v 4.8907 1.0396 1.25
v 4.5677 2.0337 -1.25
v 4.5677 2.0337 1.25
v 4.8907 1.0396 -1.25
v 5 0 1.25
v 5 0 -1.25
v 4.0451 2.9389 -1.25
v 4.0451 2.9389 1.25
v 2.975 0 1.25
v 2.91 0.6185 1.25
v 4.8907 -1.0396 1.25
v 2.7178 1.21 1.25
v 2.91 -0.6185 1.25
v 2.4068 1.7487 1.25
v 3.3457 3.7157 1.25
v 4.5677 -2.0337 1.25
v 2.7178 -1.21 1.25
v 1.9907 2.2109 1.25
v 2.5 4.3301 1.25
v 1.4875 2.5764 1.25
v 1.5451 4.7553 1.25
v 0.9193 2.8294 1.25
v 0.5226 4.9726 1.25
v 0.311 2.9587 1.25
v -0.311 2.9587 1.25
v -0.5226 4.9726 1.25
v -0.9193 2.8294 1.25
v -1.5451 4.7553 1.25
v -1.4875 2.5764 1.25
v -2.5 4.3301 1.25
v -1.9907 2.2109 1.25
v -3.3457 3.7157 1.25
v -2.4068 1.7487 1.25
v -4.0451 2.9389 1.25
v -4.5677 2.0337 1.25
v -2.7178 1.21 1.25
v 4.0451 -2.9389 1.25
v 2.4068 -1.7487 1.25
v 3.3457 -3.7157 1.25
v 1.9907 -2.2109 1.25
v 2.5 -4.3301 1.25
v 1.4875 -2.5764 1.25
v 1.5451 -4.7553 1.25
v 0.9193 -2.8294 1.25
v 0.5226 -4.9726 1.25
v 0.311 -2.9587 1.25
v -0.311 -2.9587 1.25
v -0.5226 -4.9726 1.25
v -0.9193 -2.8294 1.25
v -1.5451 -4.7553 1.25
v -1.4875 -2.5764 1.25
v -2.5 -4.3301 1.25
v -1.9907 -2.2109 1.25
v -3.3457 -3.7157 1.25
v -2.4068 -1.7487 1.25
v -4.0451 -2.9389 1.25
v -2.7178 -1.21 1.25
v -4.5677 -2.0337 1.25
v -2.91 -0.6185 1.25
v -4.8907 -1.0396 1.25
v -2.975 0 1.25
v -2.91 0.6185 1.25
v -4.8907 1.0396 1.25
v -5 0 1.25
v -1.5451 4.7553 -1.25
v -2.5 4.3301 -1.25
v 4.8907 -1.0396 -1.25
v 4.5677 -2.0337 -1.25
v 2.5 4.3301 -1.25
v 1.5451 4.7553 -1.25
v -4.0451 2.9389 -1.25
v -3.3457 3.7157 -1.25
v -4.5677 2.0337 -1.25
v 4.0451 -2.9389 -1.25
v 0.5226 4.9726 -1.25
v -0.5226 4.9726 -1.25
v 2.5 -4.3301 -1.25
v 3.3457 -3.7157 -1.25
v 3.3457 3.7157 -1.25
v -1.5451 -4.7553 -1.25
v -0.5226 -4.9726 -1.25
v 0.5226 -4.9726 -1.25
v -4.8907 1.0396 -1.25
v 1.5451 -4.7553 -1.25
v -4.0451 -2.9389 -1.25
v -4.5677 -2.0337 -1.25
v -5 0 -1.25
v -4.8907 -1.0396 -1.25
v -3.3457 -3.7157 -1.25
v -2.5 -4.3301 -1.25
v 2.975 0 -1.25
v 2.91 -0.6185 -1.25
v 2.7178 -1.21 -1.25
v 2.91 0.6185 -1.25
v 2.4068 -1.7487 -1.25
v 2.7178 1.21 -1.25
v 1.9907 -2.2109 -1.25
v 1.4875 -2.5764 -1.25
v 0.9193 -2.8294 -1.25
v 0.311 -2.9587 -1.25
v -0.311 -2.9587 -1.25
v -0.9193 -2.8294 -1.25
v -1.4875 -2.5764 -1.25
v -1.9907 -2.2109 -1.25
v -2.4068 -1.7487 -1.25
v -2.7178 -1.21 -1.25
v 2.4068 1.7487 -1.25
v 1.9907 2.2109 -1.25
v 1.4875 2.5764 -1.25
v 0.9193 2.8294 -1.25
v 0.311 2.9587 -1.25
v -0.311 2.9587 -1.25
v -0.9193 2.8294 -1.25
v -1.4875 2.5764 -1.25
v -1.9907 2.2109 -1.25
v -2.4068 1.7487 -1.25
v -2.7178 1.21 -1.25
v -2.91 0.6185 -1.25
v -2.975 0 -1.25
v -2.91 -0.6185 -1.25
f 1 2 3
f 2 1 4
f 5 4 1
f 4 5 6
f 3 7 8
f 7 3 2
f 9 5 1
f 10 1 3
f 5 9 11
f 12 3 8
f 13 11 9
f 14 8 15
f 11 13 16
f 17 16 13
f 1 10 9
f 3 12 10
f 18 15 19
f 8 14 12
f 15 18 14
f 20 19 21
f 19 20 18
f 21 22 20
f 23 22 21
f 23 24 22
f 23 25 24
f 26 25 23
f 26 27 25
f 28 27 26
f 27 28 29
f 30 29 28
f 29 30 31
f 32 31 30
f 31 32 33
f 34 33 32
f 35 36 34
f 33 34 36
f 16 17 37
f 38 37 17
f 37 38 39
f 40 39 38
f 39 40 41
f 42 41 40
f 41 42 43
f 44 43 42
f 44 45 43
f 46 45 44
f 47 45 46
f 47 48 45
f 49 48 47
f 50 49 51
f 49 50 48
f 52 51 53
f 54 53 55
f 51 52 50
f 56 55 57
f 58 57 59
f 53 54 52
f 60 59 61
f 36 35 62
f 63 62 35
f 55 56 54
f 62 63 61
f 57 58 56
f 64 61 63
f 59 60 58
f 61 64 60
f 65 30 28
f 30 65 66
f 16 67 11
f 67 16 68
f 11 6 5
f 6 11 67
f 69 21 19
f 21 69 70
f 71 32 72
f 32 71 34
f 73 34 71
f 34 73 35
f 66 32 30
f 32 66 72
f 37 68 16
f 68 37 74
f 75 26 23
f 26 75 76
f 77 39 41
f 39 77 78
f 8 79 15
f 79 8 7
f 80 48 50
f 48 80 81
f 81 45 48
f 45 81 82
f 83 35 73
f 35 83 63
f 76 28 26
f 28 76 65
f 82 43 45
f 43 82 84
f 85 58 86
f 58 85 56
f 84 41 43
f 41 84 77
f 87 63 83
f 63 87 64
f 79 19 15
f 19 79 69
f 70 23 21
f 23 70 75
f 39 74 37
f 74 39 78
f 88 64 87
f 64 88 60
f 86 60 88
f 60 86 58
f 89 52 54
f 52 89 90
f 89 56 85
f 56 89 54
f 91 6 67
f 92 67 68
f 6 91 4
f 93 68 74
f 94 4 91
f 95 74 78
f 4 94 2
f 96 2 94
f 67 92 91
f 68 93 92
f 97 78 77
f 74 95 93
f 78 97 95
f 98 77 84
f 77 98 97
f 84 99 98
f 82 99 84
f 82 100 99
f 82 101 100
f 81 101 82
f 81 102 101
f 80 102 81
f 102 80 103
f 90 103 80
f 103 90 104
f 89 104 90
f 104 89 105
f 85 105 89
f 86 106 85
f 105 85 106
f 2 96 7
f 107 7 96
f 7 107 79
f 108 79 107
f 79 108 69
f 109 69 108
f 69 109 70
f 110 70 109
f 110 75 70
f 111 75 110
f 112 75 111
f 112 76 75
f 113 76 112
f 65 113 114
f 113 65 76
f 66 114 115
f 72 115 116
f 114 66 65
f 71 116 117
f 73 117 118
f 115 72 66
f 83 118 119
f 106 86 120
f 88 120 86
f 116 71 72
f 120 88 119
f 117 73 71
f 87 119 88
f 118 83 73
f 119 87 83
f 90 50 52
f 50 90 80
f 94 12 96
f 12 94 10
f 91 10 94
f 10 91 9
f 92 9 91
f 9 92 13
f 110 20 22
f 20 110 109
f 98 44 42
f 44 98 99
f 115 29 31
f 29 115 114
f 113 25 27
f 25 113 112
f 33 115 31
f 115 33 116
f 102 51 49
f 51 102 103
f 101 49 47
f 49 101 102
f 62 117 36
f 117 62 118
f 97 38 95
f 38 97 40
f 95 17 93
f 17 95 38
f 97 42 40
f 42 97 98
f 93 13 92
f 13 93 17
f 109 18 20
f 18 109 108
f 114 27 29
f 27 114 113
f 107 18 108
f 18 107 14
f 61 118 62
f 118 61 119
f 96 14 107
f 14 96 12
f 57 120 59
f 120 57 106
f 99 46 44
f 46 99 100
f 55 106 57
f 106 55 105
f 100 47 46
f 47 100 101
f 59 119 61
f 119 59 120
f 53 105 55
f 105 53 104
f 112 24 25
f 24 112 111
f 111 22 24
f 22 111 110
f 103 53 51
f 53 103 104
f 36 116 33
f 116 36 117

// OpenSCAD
// file: ../settings.scad
// Common settings used by all scad files.

// ALL UNITS IN MILLIMETERS (MM)!!!

$fn = 30;//low-res but fast to render
//$fn = 50;//higher-res but slow to render

pi = 3.1415926535897932384626433832795;

max_footprint = 150; // 15x15 cm

bottom_clearance = 10;
bottom_clearance = 25.4/2+10;
//bottom_clearance = 30;

shell_alpha = 0.215;
//shell_alpha = 1.0;

tolerance = 0.5;

// Flat countersunk M2.5mm x 0.45mm machine screw.
screw_thread_diameter = 2.5;//2.8;//2.75;//2.4?
screw_thread_length = 5;//?
screw_head_diameter = 4.75; // M2.5
//screw_head_diameter = 5.2; // M3
screw_head_height = 1.5;//2;

screw_thread_diameter2 = 2;

unit_thickness = 5;
u = unit_thickness;

shell_thickness = unit_thickness;

// Show flags.
show_platform = 0;
show_head = 1;
show_head_shell = 0;
show_head_electronics_bb = 0;
show_battery = 1;
show_foot_cube = 0;
show_torso = 0;
show_motor = 0;
show_motor_plates = 1;
show_motor_inner_plates = 1;
show_motor_outer_plates = 1;
show_wheel = 0;//obsolete
show_tracks = 1;//
show_track_wheels = 1;
show_caster = 0;
show_rpi = 1;
show_vertical_plates = 1;//
show_horizontal_plates = 1;//
show_caster_plates = 0;//obsolete?
show_camera = 1;
show_screen = 0;
show_edge_mount = 1;
show_sonar_mount = 1;
show_recharge_mount = 1;
show_conduit = 1;
show_torso_shell = 1;
show_recharge_dock = 0;
show_head_tilt_axis = 0;
show_rpi_camera_axis = 0;
show_laser_axis = 0;

head_vertical_angle_tilt = 0;
//head_vertical_angle_tilt = 30;//max
//head_vertical_angle_tilt = 10;

torso_height = 120+20;

base_plate_diameter = max_footprint-unit_thickness*2;
base_plate_frame = 0;

head_height = 50;
head_offset_z = max_footprint/2;
head_middle_cutout = 85;

rpi_with_four_hats_and_clearance = 76;

qrd1114_w = 6.10;
qrd1114_l = 4.39;
qrd1114_h = 4.65;

dock_radius = 10;
dock_gripper_border = 2;
dock_gripper_instep = 0.9;
dock_gripper_cutout_tapper = 50;
dock_receiver_height = 5;

// Patriod Fuel+ 9000 mAh
battery_length = 90;
battery_width = 57;
battery_height = 23;
battery_offset_z = 30;//4;

wheel_diameter = 50;
wheel_offset_x = 65;
wheel_offset_z = wheel_diameter/2;
wheel_axle_diameter = 5;

//caster_diameter = 19.05; // 0.75 inches
caster_diameter = 25.45; // 1 inches
//caster_diameter = 15.875; // 5/8 inches
caster_holder_diameter = 30;//31;
caster_offset_y = base_plate_diameter/2 - caster_holder_diameter/2;

arduino_offset_x = 0;
arduino_offset_y = 0;
arduino_offset_z = 67;
arduino_offset_x2 = 0;
arduino_offset_y2 = -20;
arduino_offset_z2 = torso_height+bottom_clearance;

horizontal_plate_width = unit_thickness*8*2 - unit_thickness*2;
horizontal_plate_depth = unit_thickness*8*2;

vertical_plate_width = horizontal_plate_depth;
vertical_plate_height = unit_thickness*8;
vertical_plate_offset_x = wheel_offset_x-22.5;
vertical_plate_offset_z = vertical_plate_height/2 + unit_thickness/2;

vertical_battery_plate_height = 100 - 15;

caster_plate_width = horizontal_plate_width + unit_thickness*2;
caster_plate_mount_length = unit_thickness*4;
caster_plate_width_minor = caster_holder_diameter;

motor_switch_length = 20;
motor_switch_thickness = 6.5;
motor_switch_height = 11;
motor_switch_height_leads = 23;
motor_switch_on_height =  13.3;
motor_switch_hole_diameter = 2.5;
motor_switch_hole_offset_z = 6.5;//this plus diameter/2 is hole center from switch top
motor_switch_hole_spacing = 7.1;// holes are diameter/2 from this

motor_length = 60;
motor_width = 25;
motor_collar_width = 7;
motor_collar_height = 2.5;
motor_axle_width = 4;
motor_axle_height = 9.5;
motor_offset_x = 10;
//motor_offset_y = motor_width/2+5;
motor_offset_y = unit_thickness*3.5;
motor_offset_z = vertical_plate_height/2 - unit_thickness/2;//4;//30;
motor_mount_holes_dist = 17;
// motor countersink hole
motor_mount_holes_width = 3; // M3
motor_mount_holes_head_height = 2.2;
motor_mount_holes_head_width = 5.8;
motor_bearing_outer_diameter = 10;
motor_bearing_inner_diameter = 5.95;
motor_bearing_thickness = 2.5;

motor_unimount_idler_axle_d = screw_thread_diameter;
//motor_unimount_spacer_depth = 0.1;//too small
motor_unimount_spacer_depth = 0.5;

motor_arm_offset_y = -u*3;
motor_arm_offset_z = u*.5;

motor_plate_width = vertical_plate_width;
motor_plate_height = vertical_plate_height;
motor_plate_thickness = unit_thickness;
motor_plate_offset_z = vertical_plate_offset_z;

motor_plate_middle_thickness = 5;

wheel_hub_offset = u*3;

motor_hole_height_offset = -5;

nylon_spacer_outer_diameter = 6.35;
nylon_spacer_inner_diameter = 3.302;
nylon_spacer_length = 12.7;

track_width = unit_thickness*3;
track_offset_x = -50;
track_offset_z = .1;
//track_wheel_radius = 19;//original
track_wheel_radius = 14;
//track_wheel_hole_radius = (nylon_spacer_outer_diameter+1)/2;
track_wheel_hole_radius = motor_bearing_outer_diameter/2;

track_driver_hole_radius = (motor_axle_width)/2 + 0.1;
track_driver_set_screw_head_d = 4.1;
track_driver_set_screw_shaft_d = 2.4;
//track_wheel_width = 13.5;//original
track_wheel_width = u*2;
track_wheel_width_buffer = u*0.25;
track_offset = 3;        //distance from chassis
track_wheel_offset = track_offset;
//track_length = 250; // see tread_triangle.py, too big
//track_length = 240; // see tread_triangle.py
//track_length = 238; //inc/dec in 10 unit increments so notches match idlers
track_length = 228; //inc/dec in 10 unit increments so notches match idlers
track_radius = track_length/2/pi;
track_wheel_show_fancy = 1;
track_wheel_gap = track_wheel_width + track_wheel_width_buffer*2;
track_axle_bearing_diameter = motor_bearing_inner_diameter - 0.1;
track_tensioner_radius = 12;
track_nut_height = 3.5; //TODO
track_punchout_thickness = 0.25;//should be the same as the minimum layer thickness

head_slew_bearing_outer_diameter = 115;
head_slew_bearing_ring_thickness = 20;
head_slew_bearing_inner_diameter = head_slew_bearing_outer_diameter - head_slew_bearing_ring_thickness;
//head_slew_bearing_hole_diameter = head_slew_bearing_inner_diameter - head_slew_bearing_ring_thickness;
head_slew_bearing_hole_diameter = 12+tolerance; // slip ring https://www.adafruit.com/products/775
//head_slew_bearing_ball_diameter = 5;
head_slew_bearing_ball_diameter = 2.5; //u/2;
head_slew_bearing_height = u;//head_slew_bearing_ball_diameter*2;
head_slew_bearing_gap = 0.5;
head_slew_bearing_slew_gap = 0;
head_slew_bearing_gap_factor = 0.1;

neck_strut_width = u*7;
neck_strut_height = u*18;
neck_strut_spacing = u*8;

show_outer_race = 0;
show_inner_race_a = 1;
show_inner_race_b = 1;
show_balls = 0;
// main file
include <../settings.scad>;

module make_servo_bearing(od=0, id=0, h=0){
    // od = outer diameter
    // id = inner diameter
    // h = height or thickness
    od = od ? od : motor_bearing_outer_diameter;
    id = id ? id : motor_bearing_inner_diameter;
    h = h ? h : motor_bearing_thickness;
    difference(){
        cylinder(d=od, h=h, center=true);
        cylinder(d=id, h=h+1, center=true);
    }
}

make_servo_bearing();
